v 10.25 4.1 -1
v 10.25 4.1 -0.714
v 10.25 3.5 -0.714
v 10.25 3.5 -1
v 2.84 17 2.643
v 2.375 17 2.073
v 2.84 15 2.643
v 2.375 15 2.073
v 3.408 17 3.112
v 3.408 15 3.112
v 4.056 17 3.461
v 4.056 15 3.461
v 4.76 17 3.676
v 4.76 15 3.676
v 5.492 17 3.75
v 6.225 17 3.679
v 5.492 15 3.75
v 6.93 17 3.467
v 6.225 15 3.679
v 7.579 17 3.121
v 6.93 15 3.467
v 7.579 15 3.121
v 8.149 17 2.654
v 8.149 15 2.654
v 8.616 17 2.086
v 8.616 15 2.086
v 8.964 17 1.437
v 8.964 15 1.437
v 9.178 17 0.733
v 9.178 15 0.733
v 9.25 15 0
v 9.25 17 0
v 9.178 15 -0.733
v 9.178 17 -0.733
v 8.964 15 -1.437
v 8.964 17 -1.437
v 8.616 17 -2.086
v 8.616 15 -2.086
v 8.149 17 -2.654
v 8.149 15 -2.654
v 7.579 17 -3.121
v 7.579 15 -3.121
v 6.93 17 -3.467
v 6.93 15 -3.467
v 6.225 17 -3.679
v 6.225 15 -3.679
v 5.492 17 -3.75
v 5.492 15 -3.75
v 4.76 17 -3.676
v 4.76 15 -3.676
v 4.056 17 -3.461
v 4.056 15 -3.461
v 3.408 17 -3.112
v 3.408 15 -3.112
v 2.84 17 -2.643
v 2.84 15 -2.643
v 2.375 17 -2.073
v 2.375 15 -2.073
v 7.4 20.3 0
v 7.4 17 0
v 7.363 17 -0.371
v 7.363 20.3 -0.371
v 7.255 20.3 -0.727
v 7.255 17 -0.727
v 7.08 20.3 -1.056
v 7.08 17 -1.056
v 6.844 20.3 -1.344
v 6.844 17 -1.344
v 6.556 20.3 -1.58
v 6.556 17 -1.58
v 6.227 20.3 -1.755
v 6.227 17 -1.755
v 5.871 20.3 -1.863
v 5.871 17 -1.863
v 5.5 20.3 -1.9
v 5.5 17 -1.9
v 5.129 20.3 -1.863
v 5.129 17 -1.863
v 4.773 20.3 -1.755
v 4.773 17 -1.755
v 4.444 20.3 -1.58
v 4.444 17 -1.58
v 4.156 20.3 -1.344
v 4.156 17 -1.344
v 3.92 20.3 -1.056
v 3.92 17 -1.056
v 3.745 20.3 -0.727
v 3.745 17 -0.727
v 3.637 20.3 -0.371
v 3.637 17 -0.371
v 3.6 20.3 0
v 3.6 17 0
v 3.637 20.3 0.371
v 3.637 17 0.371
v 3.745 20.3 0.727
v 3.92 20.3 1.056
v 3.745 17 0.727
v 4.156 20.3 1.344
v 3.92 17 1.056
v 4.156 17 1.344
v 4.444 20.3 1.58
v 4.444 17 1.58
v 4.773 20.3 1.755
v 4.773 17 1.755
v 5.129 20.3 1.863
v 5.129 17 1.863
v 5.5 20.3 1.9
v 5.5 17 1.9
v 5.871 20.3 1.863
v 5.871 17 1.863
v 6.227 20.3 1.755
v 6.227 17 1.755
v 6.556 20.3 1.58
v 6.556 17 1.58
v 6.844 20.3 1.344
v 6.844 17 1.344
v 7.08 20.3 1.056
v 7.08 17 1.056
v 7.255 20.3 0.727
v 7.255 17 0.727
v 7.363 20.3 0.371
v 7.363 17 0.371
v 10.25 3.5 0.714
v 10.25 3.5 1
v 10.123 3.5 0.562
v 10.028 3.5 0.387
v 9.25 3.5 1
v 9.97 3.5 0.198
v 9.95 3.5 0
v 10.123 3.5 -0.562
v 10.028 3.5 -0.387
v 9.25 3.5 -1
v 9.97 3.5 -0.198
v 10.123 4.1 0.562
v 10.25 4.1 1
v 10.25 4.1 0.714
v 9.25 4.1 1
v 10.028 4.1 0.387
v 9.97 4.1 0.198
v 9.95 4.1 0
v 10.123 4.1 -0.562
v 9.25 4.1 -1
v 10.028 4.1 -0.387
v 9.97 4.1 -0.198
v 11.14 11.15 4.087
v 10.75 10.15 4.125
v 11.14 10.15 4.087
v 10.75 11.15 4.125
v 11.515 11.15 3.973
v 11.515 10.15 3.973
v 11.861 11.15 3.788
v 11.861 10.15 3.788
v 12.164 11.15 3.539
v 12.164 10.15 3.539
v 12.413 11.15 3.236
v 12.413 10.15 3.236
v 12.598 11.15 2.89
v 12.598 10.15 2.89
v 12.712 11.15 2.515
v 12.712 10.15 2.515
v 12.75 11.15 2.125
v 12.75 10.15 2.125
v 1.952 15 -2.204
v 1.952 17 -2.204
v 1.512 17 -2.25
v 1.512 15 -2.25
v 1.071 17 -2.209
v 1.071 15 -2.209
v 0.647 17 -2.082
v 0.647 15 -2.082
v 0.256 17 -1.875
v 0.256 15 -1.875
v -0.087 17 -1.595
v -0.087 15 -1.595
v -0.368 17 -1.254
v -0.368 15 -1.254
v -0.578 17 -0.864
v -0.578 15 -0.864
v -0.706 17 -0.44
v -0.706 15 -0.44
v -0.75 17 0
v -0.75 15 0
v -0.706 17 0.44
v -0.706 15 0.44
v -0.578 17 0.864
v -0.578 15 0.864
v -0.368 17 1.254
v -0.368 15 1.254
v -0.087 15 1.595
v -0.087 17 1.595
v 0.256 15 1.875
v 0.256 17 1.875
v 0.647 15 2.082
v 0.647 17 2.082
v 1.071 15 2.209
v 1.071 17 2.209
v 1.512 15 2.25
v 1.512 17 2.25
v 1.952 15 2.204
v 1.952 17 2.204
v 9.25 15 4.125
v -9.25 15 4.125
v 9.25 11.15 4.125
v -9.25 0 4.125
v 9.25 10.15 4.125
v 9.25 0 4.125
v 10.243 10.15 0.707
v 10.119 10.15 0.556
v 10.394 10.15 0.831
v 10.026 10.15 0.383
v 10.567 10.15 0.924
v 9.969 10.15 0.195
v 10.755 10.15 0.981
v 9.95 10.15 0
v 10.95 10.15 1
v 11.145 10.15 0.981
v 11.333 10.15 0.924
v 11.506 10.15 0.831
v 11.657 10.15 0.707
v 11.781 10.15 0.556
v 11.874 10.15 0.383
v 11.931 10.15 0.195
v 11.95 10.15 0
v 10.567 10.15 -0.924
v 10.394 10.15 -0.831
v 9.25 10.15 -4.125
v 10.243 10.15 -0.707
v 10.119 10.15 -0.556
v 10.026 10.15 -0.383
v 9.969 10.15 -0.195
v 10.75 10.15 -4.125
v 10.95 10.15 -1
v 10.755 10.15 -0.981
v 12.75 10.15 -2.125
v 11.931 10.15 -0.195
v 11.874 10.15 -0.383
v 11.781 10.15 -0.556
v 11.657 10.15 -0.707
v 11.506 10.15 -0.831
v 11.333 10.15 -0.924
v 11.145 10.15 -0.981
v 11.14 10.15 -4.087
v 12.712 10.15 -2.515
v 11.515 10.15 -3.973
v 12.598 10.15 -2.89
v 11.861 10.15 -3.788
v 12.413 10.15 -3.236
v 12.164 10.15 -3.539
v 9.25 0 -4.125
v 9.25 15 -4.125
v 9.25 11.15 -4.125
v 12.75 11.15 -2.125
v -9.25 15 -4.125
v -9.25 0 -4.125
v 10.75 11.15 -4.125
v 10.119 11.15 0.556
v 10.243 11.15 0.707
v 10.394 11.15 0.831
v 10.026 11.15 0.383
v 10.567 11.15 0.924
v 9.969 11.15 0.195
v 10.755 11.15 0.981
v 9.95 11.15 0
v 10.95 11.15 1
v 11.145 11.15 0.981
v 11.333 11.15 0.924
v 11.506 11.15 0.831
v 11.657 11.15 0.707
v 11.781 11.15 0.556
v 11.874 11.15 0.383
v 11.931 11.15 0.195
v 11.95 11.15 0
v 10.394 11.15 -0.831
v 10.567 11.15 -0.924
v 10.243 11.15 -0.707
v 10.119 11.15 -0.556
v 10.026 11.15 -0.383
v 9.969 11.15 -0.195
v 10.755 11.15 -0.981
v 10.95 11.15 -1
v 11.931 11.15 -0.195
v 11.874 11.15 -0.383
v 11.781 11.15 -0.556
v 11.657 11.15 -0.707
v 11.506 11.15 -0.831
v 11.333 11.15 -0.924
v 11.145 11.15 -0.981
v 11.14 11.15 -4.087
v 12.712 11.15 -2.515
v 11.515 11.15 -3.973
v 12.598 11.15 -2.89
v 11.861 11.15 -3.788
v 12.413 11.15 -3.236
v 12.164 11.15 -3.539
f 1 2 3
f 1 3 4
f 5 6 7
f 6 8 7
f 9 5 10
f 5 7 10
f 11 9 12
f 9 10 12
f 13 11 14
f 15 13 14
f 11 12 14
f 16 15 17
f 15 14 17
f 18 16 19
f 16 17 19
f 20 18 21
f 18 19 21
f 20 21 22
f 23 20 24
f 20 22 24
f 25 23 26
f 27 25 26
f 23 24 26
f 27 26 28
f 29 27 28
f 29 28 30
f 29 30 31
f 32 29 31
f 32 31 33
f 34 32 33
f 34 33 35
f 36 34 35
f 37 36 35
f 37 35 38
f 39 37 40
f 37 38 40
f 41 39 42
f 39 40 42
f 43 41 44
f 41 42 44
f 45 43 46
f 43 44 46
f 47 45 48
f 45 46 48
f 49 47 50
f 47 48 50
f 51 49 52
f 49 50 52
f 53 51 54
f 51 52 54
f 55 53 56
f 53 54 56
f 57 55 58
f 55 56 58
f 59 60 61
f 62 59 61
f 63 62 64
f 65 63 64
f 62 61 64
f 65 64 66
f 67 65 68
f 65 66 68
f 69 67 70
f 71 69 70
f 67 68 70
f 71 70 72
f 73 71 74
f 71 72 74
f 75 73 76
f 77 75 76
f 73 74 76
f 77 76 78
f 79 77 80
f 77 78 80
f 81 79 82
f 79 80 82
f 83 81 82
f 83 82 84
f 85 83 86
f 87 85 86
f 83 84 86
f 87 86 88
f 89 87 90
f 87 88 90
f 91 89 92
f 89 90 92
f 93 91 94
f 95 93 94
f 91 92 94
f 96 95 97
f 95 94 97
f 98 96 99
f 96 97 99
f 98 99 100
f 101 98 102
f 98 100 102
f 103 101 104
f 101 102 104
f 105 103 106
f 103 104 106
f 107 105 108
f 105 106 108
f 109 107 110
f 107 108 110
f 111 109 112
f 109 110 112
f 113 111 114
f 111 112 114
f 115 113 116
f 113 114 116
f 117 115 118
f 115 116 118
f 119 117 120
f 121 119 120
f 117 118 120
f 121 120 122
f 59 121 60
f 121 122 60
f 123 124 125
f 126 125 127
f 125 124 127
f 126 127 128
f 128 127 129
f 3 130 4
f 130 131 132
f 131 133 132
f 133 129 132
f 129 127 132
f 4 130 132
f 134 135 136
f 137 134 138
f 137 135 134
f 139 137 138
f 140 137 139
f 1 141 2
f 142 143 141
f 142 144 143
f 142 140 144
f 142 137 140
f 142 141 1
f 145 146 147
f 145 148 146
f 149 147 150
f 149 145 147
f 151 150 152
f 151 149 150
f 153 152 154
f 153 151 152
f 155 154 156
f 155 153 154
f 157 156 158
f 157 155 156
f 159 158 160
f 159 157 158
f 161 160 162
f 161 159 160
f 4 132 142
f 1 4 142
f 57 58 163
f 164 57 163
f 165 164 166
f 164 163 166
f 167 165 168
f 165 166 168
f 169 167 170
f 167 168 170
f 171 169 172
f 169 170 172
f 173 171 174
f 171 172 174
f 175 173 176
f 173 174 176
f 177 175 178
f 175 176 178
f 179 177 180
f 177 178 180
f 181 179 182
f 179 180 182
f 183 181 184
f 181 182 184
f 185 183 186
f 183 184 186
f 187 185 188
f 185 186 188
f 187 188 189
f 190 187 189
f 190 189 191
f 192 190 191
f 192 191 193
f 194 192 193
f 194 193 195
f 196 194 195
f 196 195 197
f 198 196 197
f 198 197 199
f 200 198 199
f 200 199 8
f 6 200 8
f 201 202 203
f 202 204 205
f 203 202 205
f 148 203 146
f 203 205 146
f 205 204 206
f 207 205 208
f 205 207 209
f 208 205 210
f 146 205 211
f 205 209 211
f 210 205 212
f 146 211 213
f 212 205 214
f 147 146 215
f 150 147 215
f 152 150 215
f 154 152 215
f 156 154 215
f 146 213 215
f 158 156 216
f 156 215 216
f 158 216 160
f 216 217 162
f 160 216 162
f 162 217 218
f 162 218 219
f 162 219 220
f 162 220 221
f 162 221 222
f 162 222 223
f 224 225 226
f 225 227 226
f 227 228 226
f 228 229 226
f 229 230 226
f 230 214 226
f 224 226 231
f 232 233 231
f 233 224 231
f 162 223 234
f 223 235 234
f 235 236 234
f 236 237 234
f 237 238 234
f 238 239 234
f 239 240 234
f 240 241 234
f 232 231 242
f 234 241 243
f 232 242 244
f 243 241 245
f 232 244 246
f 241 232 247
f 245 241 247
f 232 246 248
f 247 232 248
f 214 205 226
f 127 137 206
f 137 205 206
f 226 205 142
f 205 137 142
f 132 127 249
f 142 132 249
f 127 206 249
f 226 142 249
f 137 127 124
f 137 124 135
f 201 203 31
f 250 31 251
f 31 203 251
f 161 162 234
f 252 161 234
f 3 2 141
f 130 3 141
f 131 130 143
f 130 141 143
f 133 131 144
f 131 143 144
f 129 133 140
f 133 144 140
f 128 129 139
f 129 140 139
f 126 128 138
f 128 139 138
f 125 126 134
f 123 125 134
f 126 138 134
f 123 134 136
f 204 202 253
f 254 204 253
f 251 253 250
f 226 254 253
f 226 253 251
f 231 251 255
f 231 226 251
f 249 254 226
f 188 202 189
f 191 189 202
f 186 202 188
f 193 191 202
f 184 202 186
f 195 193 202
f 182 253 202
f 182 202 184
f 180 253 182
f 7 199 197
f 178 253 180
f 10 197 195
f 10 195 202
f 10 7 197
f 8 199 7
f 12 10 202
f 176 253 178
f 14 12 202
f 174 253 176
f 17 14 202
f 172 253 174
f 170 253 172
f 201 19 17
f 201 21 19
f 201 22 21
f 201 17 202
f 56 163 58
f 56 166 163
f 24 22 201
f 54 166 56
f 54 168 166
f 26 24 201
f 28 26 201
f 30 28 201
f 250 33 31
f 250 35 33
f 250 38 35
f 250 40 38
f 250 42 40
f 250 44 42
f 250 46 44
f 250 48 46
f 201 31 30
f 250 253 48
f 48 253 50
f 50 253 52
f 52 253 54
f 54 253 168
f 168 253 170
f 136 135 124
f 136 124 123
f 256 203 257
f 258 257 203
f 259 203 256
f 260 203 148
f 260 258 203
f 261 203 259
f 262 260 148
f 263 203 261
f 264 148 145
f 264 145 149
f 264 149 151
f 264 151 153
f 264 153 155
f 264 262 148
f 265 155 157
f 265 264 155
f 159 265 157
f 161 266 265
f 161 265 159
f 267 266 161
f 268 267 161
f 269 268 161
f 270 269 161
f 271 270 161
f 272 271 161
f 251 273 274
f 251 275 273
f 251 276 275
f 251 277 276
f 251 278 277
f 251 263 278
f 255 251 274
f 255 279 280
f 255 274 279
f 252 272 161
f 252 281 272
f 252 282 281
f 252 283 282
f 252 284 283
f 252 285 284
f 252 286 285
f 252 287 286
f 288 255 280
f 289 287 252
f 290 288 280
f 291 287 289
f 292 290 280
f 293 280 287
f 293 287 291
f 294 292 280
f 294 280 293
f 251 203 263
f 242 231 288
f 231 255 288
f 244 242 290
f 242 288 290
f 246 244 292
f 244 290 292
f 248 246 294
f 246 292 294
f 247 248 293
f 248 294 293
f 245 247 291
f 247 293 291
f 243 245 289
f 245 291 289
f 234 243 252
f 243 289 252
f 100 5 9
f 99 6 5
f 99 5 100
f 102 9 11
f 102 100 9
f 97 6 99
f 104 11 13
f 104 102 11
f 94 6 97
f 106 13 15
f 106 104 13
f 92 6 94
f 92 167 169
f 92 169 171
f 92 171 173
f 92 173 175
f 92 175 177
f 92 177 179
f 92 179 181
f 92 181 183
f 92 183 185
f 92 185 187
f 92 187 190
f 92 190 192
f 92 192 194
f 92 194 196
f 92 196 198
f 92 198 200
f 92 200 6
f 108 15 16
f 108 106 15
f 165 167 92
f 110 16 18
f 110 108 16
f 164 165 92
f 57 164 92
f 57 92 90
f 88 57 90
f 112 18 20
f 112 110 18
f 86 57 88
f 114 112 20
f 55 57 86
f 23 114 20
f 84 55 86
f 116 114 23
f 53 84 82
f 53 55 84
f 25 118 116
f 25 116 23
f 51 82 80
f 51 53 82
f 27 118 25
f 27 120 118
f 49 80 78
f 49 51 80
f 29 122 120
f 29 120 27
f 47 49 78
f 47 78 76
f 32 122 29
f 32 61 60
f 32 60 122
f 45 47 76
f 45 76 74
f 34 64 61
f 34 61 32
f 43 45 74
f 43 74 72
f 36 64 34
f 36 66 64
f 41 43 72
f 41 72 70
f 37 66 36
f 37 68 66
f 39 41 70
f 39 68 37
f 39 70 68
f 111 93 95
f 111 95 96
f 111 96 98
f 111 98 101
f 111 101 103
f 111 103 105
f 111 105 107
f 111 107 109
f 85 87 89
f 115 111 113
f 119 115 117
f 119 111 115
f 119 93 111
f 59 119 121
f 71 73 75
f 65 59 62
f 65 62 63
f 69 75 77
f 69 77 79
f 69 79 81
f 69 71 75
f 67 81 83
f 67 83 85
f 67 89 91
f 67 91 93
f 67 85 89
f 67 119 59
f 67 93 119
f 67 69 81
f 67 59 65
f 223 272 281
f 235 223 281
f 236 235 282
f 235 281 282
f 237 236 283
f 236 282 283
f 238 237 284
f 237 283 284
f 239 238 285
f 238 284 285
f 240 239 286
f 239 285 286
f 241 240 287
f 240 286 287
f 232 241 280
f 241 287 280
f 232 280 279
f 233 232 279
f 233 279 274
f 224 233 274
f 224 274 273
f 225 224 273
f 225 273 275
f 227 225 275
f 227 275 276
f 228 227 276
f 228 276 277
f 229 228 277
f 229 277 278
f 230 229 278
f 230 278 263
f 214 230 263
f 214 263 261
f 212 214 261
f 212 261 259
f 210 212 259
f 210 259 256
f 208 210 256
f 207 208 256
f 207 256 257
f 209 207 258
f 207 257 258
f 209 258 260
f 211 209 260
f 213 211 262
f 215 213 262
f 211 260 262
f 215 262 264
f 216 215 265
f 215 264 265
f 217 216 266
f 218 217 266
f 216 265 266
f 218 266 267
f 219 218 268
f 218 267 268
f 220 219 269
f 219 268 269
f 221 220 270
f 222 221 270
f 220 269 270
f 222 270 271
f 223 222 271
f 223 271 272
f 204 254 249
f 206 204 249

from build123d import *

# Parameters (mm, degrees)
SKETCH_1_W          = 18.5
SKETCH_1_H          = 8.25
EXTRUDE_1_DEPTH     = 15
SKETCH_2_R          = 3.75
EXTRUDE_2_DEPTH     = 2
SKETCH_3_R          = 2.25
EXTRUDE_3_DEPTH     = 2
SKETCH_4_R          = 1.9
EXTRUDE_4_DEPTH     = 3.3
SKETCH_5_W          = 2
SKETCH_5_H          = 0.6
EXTRUDE_5_DEPTH     = 1
SKETCH_6_W          = 25.5
SKETCH_6_H          = 8.25
EXTRUDE_6_DEPTH     = 1
SKETCH_7_R          = 1
CUT_EXTRUDE_1_DEPTH = 12.15
FILLET_1_R          = 2
SKETCH_8_W          = 5.807515018
SKETCH_8_H          = 9.098766066
CUT_EXTRUDE_2_DEPTH = 2


with BuildPart() as part:
    # 草图1 → 凸台-拉伸1 (new body)
    with BuildSketch(Plane(origin=(0, 0, 0), x_dir=(1, 0, 0), z_dir=(0, 1, 0))):
        Rectangle(SKETCH_1_W, SKETCH_1_H)
    extrude(amount=EXTRUDE_1_DEPTH)

    # 草图2 → 凸台-拉伸2 (add)
    with BuildSketch(Plane(origin=(0, 15, 0), x_dir=(1, 0, 0), z_dir=(0, 1, 0))):
        with Locations((5.5, 0)):
            Circle(SKETCH_2_R)
    extrude(amount=EXTRUDE_2_DEPTH)

    # 草图3 → 凸台-拉伸3 (add)
    with BuildSketch(Plane(origin=(0, 15, 0), x_dir=(1, 0, 0), z_dir=(0, 1, 0))):
        with Locations((1.5, 0)):
            Circle(SKETCH_3_R)
    extrude(amount=EXTRUDE_3_DEPTH)

    # 草图4 → 凸台-拉伸4 (add)
    with BuildSketch(Plane(origin=(0, 17, 0), x_dir=(1, 0, 0), z_dir=(0, 1, 0))):
        with Locations((5.5, 0)):
            Circle(SKETCH_4_R)
    extrude(amount=EXTRUDE_4_DEPTH)

    # 草图5 → 凸台-拉伸5 (add)
    with BuildSketch(Plane(origin=(9.25, 0, 0), x_dir=(0, 0, -1), z_dir=(1, 0, 0))):
        with Locations((0, 3.8)):
            Rectangle(SKETCH_5_W, SKETCH_5_H)
    extrude(amount=EXTRUDE_5_DEPTH)

    # 草图6 → 凸台-拉伸6 (add)
    with BuildSketch(Plane(origin=(0, 10.15, 0), x_dir=(1, 0, 0), z_dir=(0, 1, 0))):
        Rectangle(SKETCH_6_W, SKETCH_6_H)
    extrude(amount=EXTRUDE_6_DEPTH)

    # 草图7 → 切除-拉伸1 (cut, through all)
    with BuildSketch(Plane(origin=(0, 11.15, 0), x_dir=(1, 0, 0), z_dir=(0, 1, 0))):
        with Locations((-10.95, 0)):
            Circle(SKETCH_7_R)
        with Locations((10.95, 0)):
            Circle(SKETCH_7_R)
    extrude(amount=-CUT_EXTRUDE_1_DEPTH, mode=Mode.SUBTRACT)

    # 圆角1
    fillet_1_edges = [part.edges().sort_by_distance(p)[0] for p in [
        (-12.75, 10.65, 4.125),
        (12.75, 10.65, -4.125),
        (-12.75, 10.65, -4.125),
        (12.75, 10.65, 4.125),
    ]]
    fillet(fillet_1_edges, radius=FILLET_1_R)

    # 草图8 → 切除-拉伸2 (cut)
    with BuildSketch(Plane(origin=(0, 11.15, 0), x_dir=(1, 0, 0), z_dir=(0, 1, 0))):
        with Locations((-12.153757509, 0.424383033)):
            Rectangle(SKETCH_8_W, SKETCH_8_H)
    extrude(amount=-CUT_EXTRUDE_2_DEPTH, mode=Mode.SUBTRACT)


solid = part.part
